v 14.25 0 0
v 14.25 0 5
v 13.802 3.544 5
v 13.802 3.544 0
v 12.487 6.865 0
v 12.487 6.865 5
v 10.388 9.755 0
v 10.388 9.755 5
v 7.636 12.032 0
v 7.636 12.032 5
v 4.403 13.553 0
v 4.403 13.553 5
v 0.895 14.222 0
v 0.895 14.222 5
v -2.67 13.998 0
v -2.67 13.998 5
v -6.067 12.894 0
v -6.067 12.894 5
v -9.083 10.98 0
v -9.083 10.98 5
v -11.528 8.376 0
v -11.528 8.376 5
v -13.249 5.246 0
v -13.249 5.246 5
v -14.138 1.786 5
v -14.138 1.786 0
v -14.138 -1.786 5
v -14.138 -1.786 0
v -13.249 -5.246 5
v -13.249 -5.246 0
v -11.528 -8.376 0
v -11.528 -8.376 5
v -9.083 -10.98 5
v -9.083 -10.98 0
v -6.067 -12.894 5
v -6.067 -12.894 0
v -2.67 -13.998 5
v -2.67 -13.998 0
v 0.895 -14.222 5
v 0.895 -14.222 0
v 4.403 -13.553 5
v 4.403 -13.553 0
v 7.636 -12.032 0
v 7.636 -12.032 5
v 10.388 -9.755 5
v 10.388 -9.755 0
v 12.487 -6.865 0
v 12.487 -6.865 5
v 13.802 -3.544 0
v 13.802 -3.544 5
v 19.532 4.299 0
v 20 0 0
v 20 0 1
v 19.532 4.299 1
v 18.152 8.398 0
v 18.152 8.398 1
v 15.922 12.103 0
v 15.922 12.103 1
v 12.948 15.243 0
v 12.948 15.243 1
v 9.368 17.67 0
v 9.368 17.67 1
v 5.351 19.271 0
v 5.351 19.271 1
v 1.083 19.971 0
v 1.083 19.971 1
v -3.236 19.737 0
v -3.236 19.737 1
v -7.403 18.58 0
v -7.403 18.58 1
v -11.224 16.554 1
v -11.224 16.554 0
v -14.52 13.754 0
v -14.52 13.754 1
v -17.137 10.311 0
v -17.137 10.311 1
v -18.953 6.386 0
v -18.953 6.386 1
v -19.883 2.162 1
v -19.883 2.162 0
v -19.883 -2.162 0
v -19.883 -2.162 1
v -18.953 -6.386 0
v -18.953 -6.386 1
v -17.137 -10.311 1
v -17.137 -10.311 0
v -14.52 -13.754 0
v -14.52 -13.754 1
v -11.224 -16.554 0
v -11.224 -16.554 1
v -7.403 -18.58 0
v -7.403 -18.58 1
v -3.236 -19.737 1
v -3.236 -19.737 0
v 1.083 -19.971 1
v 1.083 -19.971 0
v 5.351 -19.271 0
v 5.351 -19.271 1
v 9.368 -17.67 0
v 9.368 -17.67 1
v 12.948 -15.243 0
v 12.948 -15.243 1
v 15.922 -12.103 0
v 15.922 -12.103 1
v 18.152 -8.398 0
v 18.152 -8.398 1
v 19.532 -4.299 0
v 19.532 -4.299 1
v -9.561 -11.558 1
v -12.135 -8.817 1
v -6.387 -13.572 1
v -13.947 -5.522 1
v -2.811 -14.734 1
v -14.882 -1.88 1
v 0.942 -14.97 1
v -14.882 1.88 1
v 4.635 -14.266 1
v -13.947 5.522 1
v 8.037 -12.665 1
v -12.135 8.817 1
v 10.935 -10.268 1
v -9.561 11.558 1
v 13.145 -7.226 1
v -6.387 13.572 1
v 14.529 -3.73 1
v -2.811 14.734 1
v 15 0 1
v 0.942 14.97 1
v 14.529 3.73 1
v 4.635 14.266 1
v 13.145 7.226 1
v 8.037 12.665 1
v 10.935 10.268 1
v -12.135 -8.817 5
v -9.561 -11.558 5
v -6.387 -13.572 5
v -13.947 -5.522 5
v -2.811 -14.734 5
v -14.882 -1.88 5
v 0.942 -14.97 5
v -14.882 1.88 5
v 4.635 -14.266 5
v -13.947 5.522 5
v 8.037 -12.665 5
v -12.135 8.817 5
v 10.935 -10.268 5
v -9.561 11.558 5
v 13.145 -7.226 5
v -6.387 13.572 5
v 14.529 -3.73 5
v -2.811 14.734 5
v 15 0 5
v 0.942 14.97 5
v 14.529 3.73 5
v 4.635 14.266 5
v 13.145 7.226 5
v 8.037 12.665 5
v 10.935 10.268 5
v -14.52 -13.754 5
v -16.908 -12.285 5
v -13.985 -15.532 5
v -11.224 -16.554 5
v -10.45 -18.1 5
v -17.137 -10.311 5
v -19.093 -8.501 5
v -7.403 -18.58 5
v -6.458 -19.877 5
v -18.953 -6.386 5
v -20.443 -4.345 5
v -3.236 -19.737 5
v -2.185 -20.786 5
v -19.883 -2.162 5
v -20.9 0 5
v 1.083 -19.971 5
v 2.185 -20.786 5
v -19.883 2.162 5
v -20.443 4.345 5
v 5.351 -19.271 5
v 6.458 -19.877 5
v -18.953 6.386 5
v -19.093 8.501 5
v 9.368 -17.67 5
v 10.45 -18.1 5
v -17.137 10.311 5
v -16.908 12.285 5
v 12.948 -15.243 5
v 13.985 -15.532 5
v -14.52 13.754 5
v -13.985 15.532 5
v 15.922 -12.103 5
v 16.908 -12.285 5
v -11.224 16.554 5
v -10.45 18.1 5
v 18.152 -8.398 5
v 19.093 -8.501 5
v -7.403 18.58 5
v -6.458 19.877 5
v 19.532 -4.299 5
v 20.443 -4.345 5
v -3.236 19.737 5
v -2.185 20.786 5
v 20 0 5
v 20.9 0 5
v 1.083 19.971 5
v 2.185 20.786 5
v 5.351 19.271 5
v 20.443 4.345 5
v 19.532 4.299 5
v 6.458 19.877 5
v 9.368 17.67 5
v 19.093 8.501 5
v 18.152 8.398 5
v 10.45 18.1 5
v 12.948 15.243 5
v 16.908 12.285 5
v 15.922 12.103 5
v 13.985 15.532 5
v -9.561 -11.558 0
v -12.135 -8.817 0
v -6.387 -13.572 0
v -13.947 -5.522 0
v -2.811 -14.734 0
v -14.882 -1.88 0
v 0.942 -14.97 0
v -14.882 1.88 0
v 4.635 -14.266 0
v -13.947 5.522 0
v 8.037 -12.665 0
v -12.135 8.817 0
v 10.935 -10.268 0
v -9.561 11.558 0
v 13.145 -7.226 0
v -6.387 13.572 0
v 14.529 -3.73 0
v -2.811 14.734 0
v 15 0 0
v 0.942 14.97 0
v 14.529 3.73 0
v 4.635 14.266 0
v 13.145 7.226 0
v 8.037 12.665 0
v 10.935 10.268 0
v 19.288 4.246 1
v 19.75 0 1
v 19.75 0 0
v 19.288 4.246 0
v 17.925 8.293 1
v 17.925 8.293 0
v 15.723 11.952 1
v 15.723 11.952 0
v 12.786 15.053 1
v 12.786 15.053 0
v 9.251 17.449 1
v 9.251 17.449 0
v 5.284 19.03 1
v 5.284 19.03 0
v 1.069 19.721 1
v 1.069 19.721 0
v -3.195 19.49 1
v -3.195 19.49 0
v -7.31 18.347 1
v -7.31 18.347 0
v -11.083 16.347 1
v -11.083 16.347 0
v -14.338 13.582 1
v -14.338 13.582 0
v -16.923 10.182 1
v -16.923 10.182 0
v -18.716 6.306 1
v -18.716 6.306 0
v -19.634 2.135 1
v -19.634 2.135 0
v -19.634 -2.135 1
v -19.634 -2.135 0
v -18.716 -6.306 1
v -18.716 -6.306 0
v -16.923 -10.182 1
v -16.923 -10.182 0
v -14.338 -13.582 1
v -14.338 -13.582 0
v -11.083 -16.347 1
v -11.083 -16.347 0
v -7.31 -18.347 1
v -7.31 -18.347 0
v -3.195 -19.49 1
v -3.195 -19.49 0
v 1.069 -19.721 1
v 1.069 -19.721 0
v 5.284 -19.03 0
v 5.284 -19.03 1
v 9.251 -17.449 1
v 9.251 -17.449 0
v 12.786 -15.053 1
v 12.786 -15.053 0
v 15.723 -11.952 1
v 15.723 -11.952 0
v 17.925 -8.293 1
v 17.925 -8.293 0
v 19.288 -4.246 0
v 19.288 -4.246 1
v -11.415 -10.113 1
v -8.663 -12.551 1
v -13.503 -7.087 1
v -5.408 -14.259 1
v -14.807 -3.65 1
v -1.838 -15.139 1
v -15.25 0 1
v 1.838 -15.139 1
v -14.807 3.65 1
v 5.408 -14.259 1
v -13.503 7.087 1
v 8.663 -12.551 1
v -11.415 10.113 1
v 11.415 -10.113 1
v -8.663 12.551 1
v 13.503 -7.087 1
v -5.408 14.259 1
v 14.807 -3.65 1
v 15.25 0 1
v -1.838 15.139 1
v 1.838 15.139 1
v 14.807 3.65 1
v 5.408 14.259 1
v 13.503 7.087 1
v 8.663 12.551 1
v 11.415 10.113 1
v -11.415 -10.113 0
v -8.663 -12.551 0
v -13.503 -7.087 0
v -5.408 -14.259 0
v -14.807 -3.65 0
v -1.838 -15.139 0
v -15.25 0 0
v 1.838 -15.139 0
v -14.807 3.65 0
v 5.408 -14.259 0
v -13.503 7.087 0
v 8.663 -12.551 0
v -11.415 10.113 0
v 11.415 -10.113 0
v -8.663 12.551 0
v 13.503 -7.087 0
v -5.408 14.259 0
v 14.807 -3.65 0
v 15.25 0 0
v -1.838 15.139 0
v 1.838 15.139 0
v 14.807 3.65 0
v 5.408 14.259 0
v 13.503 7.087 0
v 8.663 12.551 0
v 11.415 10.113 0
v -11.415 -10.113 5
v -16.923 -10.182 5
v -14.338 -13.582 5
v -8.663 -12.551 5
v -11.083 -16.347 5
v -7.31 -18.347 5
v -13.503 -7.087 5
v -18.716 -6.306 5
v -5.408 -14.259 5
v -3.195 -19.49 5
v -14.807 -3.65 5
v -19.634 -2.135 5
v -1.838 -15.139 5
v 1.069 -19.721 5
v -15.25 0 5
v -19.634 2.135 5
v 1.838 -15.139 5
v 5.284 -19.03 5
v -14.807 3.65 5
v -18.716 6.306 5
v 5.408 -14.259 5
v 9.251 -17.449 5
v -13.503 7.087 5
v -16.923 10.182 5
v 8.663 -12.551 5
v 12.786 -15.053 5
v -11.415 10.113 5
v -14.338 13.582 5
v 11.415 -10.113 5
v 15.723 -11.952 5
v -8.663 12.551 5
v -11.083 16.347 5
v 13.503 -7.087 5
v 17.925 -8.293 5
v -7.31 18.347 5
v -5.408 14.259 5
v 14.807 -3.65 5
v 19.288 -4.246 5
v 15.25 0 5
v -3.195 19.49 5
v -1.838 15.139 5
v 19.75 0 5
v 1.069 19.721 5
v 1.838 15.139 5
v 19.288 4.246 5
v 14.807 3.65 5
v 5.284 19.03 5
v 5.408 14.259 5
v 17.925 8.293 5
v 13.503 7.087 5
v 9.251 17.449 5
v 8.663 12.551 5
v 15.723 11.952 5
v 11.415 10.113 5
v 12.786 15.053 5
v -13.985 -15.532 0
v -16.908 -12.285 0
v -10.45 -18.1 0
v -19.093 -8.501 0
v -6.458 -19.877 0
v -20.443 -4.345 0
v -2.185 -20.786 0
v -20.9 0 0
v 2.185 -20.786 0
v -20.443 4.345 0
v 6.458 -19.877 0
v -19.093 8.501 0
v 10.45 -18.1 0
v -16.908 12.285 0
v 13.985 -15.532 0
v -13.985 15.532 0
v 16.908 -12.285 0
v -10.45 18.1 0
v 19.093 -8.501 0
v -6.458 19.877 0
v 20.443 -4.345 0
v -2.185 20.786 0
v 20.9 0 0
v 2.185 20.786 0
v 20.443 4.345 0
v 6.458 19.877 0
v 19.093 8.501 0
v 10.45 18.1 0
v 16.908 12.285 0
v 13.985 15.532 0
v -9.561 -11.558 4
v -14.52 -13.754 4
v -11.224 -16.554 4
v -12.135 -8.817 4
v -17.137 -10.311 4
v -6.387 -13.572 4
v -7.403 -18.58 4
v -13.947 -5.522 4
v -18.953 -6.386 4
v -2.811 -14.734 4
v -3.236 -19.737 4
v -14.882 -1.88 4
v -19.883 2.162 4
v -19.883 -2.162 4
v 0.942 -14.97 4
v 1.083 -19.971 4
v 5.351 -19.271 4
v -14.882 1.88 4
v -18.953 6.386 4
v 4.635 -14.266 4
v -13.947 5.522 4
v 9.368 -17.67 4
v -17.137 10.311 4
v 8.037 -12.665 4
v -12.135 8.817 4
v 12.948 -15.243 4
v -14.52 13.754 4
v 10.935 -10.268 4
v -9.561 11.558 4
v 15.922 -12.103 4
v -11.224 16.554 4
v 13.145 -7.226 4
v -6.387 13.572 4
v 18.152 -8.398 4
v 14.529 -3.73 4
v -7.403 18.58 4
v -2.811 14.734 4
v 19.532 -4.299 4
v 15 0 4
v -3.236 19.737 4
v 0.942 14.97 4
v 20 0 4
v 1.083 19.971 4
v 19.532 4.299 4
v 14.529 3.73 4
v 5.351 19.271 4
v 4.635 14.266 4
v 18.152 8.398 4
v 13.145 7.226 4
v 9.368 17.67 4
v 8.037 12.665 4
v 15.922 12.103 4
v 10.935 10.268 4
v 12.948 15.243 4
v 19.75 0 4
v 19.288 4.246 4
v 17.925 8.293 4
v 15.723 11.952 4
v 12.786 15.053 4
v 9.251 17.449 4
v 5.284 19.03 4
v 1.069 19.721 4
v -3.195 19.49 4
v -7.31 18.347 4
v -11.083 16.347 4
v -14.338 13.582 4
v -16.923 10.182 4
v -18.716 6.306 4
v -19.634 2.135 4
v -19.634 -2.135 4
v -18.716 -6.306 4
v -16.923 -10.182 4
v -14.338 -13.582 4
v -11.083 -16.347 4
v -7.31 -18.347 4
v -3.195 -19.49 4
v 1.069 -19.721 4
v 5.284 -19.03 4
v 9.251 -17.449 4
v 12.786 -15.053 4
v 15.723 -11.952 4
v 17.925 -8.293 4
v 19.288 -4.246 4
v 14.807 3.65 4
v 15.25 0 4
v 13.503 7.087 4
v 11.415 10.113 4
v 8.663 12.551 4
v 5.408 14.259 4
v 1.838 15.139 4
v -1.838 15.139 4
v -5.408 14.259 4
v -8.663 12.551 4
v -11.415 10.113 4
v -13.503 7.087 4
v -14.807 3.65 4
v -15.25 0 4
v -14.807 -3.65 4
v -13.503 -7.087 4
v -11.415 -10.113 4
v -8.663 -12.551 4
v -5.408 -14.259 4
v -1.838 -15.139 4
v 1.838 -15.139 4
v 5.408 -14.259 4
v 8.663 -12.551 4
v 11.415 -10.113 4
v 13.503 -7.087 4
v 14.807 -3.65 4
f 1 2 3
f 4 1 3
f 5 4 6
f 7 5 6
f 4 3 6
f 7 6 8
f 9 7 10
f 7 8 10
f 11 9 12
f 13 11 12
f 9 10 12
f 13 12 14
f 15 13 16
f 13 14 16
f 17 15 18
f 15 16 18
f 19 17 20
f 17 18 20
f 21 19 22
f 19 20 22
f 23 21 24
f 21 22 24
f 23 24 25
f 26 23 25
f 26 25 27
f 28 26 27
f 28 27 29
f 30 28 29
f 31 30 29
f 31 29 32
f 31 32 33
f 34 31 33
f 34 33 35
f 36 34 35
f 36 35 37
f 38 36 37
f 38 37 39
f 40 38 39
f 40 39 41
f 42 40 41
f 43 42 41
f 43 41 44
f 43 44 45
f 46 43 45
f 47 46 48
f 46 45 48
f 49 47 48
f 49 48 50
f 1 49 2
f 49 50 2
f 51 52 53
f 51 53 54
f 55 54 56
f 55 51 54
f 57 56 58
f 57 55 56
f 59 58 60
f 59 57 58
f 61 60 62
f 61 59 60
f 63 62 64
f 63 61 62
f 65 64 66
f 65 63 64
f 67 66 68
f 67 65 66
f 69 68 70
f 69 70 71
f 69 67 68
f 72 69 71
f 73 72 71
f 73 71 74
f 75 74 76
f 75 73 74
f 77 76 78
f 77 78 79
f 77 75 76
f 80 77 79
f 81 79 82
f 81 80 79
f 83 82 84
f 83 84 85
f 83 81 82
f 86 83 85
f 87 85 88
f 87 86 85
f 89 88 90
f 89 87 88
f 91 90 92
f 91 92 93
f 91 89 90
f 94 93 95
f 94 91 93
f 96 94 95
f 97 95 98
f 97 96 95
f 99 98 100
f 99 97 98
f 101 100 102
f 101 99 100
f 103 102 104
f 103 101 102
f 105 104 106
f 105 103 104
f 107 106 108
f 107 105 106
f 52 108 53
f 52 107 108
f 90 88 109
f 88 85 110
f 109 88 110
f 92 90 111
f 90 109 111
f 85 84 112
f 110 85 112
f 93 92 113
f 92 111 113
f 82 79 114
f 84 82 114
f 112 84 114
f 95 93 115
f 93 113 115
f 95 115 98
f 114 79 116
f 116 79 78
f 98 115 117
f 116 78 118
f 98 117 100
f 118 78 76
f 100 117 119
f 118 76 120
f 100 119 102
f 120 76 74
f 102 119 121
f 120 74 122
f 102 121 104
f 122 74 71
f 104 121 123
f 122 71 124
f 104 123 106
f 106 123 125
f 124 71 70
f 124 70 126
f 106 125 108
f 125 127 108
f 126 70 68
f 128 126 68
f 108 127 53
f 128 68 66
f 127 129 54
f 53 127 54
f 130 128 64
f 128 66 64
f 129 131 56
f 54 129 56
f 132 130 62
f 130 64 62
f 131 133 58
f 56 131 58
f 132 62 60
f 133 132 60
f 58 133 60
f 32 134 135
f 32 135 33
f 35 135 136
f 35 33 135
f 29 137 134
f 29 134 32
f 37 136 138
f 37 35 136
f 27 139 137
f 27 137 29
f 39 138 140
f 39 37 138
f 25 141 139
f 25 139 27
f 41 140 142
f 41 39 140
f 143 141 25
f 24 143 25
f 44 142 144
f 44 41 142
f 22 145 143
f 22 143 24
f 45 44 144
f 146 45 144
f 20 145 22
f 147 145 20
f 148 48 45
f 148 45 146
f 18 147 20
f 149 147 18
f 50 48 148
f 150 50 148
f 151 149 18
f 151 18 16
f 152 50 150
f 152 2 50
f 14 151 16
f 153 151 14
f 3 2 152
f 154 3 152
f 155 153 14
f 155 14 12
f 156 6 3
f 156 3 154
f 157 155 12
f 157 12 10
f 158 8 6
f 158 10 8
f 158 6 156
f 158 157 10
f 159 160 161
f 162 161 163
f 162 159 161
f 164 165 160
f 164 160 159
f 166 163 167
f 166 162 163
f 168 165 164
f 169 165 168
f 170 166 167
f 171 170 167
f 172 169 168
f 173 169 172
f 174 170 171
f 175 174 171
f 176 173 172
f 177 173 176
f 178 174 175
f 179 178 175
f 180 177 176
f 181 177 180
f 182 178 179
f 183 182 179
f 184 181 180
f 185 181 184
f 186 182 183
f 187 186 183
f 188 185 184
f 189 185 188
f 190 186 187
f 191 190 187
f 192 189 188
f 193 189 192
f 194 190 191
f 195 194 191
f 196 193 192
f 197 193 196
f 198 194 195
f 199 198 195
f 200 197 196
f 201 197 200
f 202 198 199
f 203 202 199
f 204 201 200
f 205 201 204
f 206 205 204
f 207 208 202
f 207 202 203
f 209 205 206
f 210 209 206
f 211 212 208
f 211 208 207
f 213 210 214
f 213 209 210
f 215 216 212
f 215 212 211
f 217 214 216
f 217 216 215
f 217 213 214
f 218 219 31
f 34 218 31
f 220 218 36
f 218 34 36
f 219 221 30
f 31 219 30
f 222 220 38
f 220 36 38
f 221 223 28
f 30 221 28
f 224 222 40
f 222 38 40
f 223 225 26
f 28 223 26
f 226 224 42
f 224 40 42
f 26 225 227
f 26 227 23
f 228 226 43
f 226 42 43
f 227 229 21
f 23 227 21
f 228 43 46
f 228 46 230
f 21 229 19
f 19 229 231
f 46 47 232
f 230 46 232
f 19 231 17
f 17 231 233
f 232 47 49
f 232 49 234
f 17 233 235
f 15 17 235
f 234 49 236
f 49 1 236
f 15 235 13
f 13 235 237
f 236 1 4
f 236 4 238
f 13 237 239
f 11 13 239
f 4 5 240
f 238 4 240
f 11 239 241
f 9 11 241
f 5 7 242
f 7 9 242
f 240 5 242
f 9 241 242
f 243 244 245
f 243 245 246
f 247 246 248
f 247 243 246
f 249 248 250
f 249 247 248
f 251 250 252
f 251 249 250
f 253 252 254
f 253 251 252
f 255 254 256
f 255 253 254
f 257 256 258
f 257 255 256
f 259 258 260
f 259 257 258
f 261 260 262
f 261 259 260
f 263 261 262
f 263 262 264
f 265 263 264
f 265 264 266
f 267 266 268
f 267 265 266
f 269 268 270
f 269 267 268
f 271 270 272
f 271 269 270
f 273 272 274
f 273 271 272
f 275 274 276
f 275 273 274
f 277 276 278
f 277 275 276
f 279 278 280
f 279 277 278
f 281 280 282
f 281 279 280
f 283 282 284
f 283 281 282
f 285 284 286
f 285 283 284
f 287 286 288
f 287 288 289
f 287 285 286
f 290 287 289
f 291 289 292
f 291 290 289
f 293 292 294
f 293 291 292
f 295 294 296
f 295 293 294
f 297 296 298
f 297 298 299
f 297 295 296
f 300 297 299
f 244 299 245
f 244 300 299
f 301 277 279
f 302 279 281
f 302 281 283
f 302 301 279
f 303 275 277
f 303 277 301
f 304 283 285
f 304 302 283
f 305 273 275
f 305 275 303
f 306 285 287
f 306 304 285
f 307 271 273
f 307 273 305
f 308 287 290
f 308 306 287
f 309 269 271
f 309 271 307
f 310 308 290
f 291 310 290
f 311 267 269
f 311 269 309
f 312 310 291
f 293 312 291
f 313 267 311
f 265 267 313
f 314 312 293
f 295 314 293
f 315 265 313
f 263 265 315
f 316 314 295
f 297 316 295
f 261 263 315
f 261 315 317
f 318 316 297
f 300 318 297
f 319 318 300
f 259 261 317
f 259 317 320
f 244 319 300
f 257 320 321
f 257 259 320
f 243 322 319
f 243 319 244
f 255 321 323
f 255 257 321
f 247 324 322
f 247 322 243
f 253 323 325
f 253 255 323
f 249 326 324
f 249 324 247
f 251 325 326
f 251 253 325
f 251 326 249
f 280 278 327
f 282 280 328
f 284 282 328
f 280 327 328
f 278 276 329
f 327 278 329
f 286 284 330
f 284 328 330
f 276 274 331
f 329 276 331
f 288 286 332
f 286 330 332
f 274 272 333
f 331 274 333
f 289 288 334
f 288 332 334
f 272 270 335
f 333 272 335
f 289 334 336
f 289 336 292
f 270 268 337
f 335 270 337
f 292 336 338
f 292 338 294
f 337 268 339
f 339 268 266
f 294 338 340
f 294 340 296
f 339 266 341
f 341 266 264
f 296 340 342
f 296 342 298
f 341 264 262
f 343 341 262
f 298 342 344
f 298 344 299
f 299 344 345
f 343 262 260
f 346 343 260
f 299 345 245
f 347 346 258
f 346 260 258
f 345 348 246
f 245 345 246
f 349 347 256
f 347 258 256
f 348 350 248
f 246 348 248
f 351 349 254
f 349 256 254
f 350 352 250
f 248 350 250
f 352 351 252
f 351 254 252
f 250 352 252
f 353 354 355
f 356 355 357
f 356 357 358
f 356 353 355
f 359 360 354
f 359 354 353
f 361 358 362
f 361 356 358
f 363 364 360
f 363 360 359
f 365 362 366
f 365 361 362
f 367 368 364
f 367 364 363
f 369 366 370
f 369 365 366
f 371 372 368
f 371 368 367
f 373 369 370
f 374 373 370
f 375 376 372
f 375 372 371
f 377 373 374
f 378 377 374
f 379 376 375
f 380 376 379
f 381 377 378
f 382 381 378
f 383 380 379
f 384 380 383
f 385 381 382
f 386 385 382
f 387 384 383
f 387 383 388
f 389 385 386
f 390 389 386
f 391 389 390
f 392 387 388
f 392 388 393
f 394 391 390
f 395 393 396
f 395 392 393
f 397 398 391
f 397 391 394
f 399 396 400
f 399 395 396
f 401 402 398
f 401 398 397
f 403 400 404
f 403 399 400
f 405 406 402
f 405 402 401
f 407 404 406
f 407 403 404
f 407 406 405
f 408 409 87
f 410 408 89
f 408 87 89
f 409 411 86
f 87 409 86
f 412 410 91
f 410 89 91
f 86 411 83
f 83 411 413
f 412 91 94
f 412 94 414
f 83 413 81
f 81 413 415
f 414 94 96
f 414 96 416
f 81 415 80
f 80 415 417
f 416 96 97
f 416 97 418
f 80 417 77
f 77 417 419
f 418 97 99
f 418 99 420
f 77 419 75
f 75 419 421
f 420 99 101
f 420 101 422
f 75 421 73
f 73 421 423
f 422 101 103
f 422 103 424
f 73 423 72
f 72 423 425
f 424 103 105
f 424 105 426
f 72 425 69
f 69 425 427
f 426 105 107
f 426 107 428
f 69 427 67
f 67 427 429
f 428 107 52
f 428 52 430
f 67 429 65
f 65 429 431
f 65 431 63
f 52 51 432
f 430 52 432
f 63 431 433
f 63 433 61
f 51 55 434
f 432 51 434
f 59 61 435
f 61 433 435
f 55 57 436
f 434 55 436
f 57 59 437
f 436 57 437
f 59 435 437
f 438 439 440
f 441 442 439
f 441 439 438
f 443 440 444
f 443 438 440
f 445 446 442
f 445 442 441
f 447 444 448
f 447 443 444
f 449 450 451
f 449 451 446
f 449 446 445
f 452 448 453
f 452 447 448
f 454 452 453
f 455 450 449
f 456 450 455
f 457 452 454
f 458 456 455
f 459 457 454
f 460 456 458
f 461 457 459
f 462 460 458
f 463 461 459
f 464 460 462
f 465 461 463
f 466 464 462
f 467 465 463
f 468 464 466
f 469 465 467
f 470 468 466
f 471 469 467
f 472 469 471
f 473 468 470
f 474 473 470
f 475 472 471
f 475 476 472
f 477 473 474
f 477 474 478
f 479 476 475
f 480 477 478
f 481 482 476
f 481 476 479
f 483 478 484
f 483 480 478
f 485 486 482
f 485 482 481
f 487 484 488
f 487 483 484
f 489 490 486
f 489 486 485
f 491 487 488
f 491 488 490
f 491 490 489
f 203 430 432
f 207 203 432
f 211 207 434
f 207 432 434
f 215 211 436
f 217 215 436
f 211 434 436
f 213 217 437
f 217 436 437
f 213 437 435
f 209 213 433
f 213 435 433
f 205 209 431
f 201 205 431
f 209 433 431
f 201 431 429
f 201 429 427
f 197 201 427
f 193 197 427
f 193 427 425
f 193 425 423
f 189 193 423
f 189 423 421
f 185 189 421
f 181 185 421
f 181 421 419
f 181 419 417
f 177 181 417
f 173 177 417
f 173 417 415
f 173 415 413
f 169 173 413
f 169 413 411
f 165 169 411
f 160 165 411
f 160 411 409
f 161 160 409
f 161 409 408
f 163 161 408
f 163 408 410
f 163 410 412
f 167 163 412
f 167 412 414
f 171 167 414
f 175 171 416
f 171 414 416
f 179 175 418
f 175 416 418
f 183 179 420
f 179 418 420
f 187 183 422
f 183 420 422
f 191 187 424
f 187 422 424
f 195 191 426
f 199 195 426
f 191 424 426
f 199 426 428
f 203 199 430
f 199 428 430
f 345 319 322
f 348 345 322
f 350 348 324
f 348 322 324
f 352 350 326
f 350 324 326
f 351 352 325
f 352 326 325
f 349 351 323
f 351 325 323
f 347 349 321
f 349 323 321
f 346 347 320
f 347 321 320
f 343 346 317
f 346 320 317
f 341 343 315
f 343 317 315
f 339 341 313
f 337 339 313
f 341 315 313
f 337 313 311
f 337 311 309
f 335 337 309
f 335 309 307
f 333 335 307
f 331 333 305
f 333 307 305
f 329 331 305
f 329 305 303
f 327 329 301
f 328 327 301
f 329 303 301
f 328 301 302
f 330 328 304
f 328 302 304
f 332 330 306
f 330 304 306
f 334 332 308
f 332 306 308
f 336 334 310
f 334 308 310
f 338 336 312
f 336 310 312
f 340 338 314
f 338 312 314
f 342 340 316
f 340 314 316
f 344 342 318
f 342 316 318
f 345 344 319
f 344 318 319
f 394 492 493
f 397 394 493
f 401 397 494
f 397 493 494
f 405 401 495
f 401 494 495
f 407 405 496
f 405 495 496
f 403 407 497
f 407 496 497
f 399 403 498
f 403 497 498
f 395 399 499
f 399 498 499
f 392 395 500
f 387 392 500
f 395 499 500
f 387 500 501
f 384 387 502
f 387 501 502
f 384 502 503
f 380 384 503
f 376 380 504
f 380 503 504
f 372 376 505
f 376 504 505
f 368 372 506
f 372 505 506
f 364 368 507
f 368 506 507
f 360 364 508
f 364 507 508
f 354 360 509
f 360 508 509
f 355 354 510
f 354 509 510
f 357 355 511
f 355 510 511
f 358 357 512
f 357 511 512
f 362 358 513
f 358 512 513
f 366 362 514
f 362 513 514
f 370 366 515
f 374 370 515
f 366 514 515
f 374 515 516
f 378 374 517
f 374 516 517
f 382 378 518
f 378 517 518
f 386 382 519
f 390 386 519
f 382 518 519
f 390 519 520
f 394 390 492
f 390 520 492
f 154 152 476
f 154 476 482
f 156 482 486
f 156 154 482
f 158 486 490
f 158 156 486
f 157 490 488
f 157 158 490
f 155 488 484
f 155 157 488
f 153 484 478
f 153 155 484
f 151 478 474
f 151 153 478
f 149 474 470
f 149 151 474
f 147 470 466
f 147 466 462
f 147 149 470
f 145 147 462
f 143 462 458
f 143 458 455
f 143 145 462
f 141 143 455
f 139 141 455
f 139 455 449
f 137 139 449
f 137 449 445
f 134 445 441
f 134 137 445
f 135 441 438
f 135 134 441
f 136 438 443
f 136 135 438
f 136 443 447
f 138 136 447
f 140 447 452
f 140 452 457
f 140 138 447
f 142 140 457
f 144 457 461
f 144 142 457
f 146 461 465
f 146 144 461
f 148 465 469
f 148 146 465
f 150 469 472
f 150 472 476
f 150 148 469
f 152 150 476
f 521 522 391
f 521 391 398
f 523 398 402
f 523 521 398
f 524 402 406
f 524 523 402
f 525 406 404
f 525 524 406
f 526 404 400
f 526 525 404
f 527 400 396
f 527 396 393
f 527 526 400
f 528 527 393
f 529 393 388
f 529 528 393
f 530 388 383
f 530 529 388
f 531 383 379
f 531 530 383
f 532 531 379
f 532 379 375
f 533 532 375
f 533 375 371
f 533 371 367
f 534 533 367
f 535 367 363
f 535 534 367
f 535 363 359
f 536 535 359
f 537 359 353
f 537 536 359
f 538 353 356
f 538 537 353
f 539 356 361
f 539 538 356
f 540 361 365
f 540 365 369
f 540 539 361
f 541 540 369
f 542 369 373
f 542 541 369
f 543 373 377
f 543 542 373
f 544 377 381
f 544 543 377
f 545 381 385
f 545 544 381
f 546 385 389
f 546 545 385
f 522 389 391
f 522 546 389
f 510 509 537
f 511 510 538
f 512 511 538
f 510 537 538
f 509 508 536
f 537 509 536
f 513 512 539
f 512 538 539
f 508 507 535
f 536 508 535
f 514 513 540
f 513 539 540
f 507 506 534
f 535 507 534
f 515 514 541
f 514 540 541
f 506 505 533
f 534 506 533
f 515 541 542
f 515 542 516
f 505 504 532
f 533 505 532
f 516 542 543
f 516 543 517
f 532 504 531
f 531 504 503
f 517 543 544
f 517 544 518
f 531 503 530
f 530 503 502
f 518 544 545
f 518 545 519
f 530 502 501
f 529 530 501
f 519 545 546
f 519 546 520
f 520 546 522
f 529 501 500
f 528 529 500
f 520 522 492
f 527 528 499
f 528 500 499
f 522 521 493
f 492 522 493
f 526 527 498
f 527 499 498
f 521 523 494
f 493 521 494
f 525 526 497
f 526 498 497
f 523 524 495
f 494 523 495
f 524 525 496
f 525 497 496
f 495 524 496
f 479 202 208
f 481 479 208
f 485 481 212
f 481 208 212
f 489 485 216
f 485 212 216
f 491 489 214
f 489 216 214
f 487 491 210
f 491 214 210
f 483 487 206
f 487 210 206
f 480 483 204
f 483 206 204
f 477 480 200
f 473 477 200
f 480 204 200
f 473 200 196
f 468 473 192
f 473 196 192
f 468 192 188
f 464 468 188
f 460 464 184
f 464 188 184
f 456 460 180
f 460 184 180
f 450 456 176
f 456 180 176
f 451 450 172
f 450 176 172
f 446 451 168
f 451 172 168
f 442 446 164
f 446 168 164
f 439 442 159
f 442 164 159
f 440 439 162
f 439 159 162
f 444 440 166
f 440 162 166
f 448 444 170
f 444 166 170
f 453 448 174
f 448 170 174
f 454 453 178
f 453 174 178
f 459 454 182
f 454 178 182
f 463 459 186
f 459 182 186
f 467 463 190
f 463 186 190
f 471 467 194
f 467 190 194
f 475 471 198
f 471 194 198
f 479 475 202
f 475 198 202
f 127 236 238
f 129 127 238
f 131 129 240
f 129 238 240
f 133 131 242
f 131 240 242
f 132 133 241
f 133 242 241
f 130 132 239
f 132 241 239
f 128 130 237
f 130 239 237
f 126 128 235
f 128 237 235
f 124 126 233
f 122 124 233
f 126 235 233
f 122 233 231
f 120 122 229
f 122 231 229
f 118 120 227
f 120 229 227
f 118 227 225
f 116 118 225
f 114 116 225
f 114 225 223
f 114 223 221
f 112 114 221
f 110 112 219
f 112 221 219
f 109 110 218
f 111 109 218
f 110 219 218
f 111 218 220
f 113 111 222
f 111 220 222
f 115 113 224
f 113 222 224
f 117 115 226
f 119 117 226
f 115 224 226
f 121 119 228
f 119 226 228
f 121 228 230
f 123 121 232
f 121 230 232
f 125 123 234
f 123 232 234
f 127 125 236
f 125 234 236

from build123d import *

# Parameters (mm, degrees)
F0_R     = 20.9
F1_DEPTH = 5
F2_R     = 14.25
F3_DEPTH = 25
F4_R     = 20
F4_R_2   = 15
F5_DEPTH = 1
F6_R     = 19.75
F6_R_2   = 15.25
F7_DEPTH = 1
F8_R     = 29.8872921221
F8_R_2   = 20.9
F9_DEPTH = 2.5


# Not quite as in the source:
# - a feature of the source that left no trace in its solid (it failed there, or was rolled back) is left out
# - a pattern or mirror of a feature is missing from the dataset's text; its kind, count and spacing are read off the source's solid


with BuildPart() as f1:
    # F0 (on Top) → F1 (new body)
    with BuildSketch(Plane.XY):
        Circle(F0_R)
    extrude(amount=F1_DEPTH)

    # F2 (on face) → F3 (cut)
    with BuildSketch(Plane.XY.offset(5)):
        Circle(F2_R)
    extrude(amount=-F3_DEPTH, mode=Mode.SUBTRACT)

    # F4 (on face) → F5 (cut)
    with BuildSketch(Plane.XY.offset(5)):
        Circle(F4_R)
        Circle(F4_R_2, mode=Mode.SUBTRACT)
    f5 = extrude(amount=-F5_DEPTH, mode=Mode.SUBTRACT)

    # F5_copies: F5 across plane
    add(f5.mirror(Plane(origin=(0, 0, 2.5), x_dir=(-1, 0, 0), z_dir=(0, 0, -1))), mode=Mode.SUBTRACT)

    # F8 (on face) → F9 (cut)
    with BuildSketch(Plane(origin=(0, 0, 0), x_dir=(1, 0, 0), z_dir=(0, 0, -1))):
        Circle(F8_R)
        Circle(F8_R_2, mode=Mode.SUBTRACT)
    extrude(amount=-F9_DEPTH, mode=Mode.SUBTRACT)


with BuildPart() as f7:
    # F6 (on face) → F7 (new body)
    with BuildSketch(Plane.XY.offset(4)):
        Circle(F6_R)
        Circle(F6_R_2, mode=Mode.SUBTRACT)
    extrude(amount=F7_DEPTH)


with BuildPart() as f7_copies_1:
    # F7_copies: instance of F7
    add(f7.part.mirror(Plane(origin=(0, 0, 2.5), x_dir=(-1, 0, 0), z_dir=(0, 0, -1))))


solid = Compound([f1.part, f7.part, f7_copies_1.part])
